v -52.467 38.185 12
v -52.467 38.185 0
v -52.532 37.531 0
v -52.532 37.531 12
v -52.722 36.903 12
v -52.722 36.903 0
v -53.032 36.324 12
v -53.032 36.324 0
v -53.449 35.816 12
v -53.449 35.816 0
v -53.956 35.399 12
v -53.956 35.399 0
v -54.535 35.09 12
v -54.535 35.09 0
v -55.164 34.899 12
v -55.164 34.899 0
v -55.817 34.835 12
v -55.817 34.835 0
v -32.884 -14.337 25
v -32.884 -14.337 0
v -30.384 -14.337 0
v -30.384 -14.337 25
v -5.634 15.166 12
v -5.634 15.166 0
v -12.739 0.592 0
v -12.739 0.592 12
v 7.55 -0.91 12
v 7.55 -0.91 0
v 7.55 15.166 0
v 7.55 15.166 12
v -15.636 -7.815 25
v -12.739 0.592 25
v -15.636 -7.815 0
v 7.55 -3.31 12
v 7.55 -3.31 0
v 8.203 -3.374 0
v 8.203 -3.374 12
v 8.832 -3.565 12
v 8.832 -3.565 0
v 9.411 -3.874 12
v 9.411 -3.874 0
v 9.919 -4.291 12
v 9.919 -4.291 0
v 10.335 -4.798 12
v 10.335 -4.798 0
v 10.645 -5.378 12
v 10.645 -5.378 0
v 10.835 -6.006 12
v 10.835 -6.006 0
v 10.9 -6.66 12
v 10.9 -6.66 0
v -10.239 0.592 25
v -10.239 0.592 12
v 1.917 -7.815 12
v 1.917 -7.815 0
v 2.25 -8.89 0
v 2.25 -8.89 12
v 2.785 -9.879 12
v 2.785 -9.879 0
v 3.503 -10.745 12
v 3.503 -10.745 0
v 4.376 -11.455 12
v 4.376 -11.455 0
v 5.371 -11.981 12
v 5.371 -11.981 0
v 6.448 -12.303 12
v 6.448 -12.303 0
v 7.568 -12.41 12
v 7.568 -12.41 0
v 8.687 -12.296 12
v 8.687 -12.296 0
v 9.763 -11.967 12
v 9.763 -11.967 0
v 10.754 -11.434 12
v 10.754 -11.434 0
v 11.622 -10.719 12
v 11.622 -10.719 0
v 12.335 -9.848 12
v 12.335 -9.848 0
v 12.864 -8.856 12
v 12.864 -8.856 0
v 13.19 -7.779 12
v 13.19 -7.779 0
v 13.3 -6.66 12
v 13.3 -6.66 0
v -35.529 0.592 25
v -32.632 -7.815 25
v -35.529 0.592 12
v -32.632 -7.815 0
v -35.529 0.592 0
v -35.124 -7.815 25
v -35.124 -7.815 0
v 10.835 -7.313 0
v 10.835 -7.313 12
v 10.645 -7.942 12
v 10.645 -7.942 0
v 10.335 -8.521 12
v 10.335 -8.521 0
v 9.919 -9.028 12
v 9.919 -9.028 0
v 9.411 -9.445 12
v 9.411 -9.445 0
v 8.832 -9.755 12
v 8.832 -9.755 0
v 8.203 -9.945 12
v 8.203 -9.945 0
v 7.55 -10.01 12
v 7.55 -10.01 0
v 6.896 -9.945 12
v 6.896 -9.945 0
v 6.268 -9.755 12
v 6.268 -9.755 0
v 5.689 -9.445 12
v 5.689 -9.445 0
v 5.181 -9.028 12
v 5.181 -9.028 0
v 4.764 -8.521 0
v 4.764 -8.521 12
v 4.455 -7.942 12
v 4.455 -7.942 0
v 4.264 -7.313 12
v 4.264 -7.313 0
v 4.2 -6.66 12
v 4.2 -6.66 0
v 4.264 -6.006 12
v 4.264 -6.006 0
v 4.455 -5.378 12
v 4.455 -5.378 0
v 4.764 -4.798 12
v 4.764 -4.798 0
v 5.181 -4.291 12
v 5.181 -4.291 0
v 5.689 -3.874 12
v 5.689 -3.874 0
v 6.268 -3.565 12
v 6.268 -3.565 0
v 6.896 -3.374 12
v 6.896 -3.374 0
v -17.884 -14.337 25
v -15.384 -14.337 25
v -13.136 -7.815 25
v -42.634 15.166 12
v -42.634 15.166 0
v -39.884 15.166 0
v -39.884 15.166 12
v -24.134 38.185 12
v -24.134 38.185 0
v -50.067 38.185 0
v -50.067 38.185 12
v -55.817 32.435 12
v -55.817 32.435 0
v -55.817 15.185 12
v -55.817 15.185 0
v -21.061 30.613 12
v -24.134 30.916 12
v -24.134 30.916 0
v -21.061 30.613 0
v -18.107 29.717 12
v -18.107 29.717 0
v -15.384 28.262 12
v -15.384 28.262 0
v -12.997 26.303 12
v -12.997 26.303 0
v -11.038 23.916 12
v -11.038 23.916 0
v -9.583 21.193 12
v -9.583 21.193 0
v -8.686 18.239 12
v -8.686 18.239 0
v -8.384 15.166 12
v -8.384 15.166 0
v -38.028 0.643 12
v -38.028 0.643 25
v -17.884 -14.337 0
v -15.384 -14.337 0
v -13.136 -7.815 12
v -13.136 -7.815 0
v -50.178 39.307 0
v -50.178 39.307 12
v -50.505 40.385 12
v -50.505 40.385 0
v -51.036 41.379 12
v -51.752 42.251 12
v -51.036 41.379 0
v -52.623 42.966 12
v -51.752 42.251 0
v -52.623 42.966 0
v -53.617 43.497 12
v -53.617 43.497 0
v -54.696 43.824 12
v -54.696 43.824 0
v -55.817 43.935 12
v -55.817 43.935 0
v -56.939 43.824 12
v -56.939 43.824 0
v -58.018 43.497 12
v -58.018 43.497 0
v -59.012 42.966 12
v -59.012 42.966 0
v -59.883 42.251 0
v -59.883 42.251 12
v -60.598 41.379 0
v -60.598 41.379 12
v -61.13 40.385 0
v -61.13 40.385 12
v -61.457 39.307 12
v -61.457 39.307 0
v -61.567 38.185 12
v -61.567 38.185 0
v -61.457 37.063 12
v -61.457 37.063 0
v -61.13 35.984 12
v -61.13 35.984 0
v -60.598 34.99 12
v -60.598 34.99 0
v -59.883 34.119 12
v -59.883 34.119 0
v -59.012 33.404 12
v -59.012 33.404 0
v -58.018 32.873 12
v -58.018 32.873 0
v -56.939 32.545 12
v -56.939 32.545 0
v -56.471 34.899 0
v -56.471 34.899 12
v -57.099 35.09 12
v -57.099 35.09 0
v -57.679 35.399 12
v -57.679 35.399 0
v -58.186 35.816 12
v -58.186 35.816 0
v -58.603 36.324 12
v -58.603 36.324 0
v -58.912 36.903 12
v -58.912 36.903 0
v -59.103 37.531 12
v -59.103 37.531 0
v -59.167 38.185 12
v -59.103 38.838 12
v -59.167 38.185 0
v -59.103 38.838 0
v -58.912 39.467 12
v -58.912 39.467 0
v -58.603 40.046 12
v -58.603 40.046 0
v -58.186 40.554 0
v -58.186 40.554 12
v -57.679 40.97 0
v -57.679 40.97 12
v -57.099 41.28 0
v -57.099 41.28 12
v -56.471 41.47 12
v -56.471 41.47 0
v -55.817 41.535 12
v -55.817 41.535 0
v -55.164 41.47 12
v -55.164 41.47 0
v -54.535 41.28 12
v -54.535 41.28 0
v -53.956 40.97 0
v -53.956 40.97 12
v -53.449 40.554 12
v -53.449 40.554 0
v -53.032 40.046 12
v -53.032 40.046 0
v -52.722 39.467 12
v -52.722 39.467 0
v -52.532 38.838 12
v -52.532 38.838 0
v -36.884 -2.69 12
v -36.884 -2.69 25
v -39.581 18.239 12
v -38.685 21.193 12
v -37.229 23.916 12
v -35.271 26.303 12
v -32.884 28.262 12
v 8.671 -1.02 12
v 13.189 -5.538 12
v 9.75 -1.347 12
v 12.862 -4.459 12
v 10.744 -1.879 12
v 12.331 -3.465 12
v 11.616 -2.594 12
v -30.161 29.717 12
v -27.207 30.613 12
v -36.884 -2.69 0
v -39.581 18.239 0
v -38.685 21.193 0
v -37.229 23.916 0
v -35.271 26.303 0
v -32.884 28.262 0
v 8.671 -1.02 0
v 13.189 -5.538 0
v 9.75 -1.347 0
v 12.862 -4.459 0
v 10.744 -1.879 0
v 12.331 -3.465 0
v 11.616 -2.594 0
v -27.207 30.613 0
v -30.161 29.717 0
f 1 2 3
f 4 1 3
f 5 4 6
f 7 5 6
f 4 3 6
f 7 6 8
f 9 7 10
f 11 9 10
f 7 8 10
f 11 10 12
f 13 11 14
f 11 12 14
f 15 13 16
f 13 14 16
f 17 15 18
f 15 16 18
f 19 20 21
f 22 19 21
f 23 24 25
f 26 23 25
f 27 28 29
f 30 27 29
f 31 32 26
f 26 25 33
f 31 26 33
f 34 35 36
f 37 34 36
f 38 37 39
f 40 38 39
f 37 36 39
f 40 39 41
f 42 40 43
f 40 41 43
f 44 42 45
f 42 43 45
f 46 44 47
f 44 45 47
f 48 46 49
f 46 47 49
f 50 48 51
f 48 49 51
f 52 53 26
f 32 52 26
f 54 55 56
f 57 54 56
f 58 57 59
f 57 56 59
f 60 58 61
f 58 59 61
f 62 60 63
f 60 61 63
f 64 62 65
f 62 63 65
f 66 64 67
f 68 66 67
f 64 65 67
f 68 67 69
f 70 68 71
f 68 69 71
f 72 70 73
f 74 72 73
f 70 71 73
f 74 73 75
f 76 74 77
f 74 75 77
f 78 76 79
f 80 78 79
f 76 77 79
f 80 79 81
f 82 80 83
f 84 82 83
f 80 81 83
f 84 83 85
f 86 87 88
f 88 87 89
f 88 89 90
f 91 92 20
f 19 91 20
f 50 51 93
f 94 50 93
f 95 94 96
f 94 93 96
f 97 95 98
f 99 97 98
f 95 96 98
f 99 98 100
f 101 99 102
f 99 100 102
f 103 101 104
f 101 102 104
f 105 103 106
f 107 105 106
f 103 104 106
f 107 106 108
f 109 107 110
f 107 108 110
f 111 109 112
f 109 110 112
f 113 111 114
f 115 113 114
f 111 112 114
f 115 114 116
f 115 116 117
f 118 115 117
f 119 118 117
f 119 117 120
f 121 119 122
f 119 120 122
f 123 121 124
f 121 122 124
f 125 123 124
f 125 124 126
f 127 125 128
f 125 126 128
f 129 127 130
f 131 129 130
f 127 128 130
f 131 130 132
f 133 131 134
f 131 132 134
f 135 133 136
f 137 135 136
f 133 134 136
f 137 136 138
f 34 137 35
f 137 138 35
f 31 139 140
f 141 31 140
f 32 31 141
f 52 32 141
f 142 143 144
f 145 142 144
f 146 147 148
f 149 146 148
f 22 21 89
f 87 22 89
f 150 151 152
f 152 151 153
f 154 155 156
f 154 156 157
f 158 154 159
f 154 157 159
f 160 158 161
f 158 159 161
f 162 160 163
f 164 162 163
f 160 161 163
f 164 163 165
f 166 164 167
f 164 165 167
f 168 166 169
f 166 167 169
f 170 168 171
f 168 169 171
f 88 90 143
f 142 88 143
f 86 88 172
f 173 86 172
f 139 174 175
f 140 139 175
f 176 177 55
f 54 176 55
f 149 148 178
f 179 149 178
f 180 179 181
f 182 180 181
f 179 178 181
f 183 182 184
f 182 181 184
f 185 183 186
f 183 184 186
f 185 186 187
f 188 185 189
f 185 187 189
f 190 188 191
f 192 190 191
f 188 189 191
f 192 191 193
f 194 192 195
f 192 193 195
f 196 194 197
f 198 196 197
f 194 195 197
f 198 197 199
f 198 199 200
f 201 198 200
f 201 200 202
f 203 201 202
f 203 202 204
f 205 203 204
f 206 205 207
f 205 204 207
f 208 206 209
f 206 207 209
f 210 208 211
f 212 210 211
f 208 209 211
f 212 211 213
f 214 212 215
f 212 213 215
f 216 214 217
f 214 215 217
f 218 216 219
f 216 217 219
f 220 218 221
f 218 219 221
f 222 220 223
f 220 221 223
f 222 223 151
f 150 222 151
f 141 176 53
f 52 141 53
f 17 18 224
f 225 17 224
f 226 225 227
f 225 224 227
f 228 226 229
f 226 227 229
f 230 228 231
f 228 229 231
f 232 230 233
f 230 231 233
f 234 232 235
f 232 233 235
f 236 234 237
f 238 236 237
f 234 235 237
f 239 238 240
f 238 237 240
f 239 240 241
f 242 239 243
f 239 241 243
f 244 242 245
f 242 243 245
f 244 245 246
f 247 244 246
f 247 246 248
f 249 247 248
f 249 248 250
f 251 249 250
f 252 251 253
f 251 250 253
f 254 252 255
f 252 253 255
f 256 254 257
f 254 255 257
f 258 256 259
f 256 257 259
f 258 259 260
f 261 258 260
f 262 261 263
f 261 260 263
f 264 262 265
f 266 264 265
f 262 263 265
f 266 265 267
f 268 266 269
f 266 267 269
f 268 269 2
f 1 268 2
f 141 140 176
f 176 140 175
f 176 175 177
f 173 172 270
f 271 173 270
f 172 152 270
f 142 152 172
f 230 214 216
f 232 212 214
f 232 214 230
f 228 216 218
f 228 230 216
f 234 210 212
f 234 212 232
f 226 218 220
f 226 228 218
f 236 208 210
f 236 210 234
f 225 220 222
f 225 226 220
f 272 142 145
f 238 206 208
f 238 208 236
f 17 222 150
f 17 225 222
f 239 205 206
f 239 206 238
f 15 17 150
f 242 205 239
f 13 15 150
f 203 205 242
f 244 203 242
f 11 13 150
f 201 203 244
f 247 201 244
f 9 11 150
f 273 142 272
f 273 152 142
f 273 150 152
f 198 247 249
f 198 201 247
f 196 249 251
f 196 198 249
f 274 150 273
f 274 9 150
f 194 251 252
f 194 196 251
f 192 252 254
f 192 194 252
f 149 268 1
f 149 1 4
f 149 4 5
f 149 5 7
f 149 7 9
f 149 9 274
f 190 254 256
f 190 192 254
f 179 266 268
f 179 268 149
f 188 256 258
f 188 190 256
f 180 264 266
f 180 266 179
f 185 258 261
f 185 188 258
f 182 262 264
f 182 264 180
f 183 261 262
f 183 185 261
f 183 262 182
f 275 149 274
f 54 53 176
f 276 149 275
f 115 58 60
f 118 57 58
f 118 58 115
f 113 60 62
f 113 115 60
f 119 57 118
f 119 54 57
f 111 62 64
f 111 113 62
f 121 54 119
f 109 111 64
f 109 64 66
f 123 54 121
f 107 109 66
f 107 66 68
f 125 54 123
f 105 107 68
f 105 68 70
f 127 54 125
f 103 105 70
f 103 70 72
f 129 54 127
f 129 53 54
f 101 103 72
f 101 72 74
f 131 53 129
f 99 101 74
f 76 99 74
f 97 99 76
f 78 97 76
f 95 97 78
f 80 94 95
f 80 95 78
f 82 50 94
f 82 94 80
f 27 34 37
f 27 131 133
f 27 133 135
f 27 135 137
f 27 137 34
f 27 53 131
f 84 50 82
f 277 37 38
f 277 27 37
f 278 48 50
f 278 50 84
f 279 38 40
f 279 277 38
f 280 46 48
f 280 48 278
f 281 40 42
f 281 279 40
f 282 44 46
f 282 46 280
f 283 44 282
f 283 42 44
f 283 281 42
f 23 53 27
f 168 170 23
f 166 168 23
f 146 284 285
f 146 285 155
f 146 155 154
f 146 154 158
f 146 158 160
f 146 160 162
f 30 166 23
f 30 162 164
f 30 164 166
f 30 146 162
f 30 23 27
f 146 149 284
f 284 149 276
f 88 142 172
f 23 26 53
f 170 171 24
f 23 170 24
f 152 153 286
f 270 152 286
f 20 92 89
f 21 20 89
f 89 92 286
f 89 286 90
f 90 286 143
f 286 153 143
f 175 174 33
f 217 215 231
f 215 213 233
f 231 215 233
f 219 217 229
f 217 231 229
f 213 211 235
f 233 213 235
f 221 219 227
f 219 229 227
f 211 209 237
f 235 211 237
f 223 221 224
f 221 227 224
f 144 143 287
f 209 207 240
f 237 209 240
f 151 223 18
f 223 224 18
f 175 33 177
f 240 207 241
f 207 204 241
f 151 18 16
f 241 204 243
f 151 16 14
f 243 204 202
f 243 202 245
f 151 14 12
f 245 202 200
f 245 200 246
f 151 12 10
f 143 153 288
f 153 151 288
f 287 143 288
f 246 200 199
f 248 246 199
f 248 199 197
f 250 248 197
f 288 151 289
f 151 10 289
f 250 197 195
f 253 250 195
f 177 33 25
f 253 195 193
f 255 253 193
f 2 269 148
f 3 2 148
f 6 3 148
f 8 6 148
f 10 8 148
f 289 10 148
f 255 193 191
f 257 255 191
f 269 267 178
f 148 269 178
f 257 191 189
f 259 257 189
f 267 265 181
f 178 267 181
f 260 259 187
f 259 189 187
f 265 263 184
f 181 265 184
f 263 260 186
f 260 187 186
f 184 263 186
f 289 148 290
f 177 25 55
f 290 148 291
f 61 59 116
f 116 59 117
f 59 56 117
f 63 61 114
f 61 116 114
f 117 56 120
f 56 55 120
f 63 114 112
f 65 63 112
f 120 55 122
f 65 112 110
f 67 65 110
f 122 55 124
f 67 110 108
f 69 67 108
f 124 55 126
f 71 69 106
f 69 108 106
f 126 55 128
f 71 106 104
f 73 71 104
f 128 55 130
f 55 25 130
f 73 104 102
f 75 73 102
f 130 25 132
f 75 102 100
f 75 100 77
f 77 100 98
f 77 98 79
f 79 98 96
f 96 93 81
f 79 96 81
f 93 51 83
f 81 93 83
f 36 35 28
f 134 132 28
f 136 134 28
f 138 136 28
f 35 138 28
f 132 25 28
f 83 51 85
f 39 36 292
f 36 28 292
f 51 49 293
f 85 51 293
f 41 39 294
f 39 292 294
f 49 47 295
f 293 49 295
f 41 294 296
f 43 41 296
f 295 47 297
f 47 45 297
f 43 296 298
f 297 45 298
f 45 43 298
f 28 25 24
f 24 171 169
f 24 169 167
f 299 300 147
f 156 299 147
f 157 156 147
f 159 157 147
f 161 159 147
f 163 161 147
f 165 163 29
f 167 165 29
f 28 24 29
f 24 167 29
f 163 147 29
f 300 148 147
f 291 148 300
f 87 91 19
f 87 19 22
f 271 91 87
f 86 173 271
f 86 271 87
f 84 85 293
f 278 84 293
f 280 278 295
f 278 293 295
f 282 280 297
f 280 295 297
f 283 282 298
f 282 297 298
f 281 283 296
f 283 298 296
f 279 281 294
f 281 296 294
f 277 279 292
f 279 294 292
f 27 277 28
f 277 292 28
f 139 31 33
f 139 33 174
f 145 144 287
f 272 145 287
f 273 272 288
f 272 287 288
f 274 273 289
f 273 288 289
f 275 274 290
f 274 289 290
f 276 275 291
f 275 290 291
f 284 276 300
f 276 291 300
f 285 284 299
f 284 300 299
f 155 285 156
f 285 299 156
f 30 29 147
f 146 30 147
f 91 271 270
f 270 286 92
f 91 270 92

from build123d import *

# Parameters (mm, degrees)
F1_DEPTH = 12
F2_DEPTH = 25


# Not quite as in the source:
# - ends of sketch curves that miss each other by under 0.0002 mm in the source are joined


with BuildPart() as f1:
    # F0 (on Top) → F1 (new body)
    with BuildSketch(Plane.XY):
        with BuildLine():
            ThreePointArc((-55.8174114415, 34.8348648238), (-58.1862191586, 40.5536725408), (-52.4674114416, 38.1848648238))
            Line((-52.4674114416, 38.1848648238), (-50.0674114416, 38.1848649627))
            ThreePointArc((-50.0674114416, 38.1848649627), (-59.8832754334, 42.2507288156), (-55.8174114415, 32.4348648238))
            Line((-55.8174114415, 32.4348648238), (-55.8174114415, 34.8348648238))
        make_face()
        with BuildLine():
            Line((-50.0674114416, 38.1848649627), (-52.4674114416, 38.1848649047))
            ThreePointArc((-52.4674114416, 38.1848649047), (-53.4486037246, 35.8160571069), (-55.8174114415, 34.8348648238))
            Line((-55.8174114415, 34.8348648238), (-55.8174114415, 32.4348648238))
            ThreePointArc((-55.8174114415, 32.4348648238), (-51.7515474497, 34.119000832), (-50.0674114416, 38.1848649627))
        make_face()
        with BuildLine():
            Line((-24.1338443596, 38.184865589), (-50.0674114416, 38.1848649627))
            ThreePointArc((-50.0674114416, 38.1848649627), (-51.7515474497, 34.119000832), (-55.8174114415, 32.4348648238))
            Line((-55.8174114415, 32.4348648238), (-55.8174114412, 15.1848640586))
            Line((-55.8174114412, 15.1848640586), (-42.6338443592, 15.1659585535))
            ThreePointArc((-42.6338443592, 15.1659585535), (-37.2153198113, 28.2474340054), (-24.1338443595, 33.6659585535))
            Line((-24.1338443595, 33.6659585535), (-24.1338443596, 38.184865589))
        make_face()
        with BuildLine():
            Line((-24.1338443595, 30.9159585535), (-24.1338443595, 33.6659585535))
            ThreePointArc((-24.1338443595, 33.6659585535), (-37.2153198113, 28.2474340054), (-42.6338443592, 15.1659585535))
            Line((-42.6338443592, 15.1659585535), (-39.8838443592, 15.1659585535))
            ThreePointArc((-39.8838443592, 15.1659585535), (-35.270776163, 26.3028903571), (-24.1338443595, 30.9159585535))
        make_face()
        with BuildLine():
            Line((7.5497227227, 15.1659585535), (-24.1338443596, 38.184865589))
            Line((-24.1338443596, 38.184865589), (-24.1338443595, 33.6659585535))
            ThreePointArc((-24.1338443595, 33.6659585535), (-11.0523689074, 28.2474340056), (-5.6338443592, 15.1659585535))
            Line((-5.6338443592, 15.1659585535), (7.5497227227, 15.1659585535))
        make_face()
        with BuildLine():
            ThreePointArc((-5.6338443592, 15.1659585535), (-11.0523689074, 28.2474340056), (-24.1338443595, 33.6659585535))
            Line((-24.1338443595, 33.6659585535), (-24.1338443595, 30.9159585535))
            ThreePointArc((-24.1338443595, 30.9159585535), (-12.9969125556, 26.3028903573), (-8.3838443592, 15.1659585535))
            Line((-8.3838443592, 15.1659585535), (-5.6338443592, 15.1659585535))
        make_face()
        with BuildLine():
            Line((7.549722723, -0.909568585), (7.5497227227, 15.1659585535))
            Line((7.5497227227, 15.1659585535), (-5.6338443592, 15.1659585535))
            Line((-5.6338443592, 15.1659585535), (-12.7387191109, 0.5919707473))
            Line((-12.7387191109, 0.5919707473), (-10.2387191109, 0.5919707473))
            Line((-10.2387191109, 0.5919707473), (-13.136122196, -7.8151351762))
            Line((-13.136122196, -7.8151351762), (1.9170354556, -7.8151351762))
            ThreePointArc((1.9170354556, -7.8151351762), (3.0939956275, -3.0251503303), (7.549722723, -0.909568585))
        make_face()
        Polygon((-42.6338443592, 15.1659585535), (-55.8174114412, 15.1848640586), (-36.8837256357, -2.690086035), (-38.0284454354, 0.643162408), (-35.5289696075, 0.5919707473), align=None)
        with BuildLine():
            ThreePointArc((13.2997227231, -6.659568585), (11.6155867149, -2.5937045931), (7.549722723, -0.909568585))
            ThreePointArc((7.549722723, -0.909568585), (3.0939956275, -3.0251503303), (1.9170354556, -7.8151351762))
            ThreePointArc((1.9170354556, -7.8151351762), (8.1304757738, -12.3801652229), (13.2997227231, -6.659568585))
        make_face()
        with BuildLine():
            ThreePointArc((10.8997227231, -6.659568585), (5.1809150061, -9.028376302), (7.549722723, -3.309568585))
            ThreePointArc((7.549722723, -3.309568585), (9.91853044, -4.290760868), (10.8997227231, -6.659568585))
        make_face(mode=Mode.SUBTRACT)
        Polygon((-38.0284454354, 0.643162408), (-36.8837256357, -2.690086035), (-35.1236572441, -7.8151351762), (-32.6315665225, -7.8151351762), (-35.5289696075, 0.5919707473), align=None)
        Polygon((-32.6315665225, -7.8151351762), (-35.1236572441, -7.8151351762), (-32.8838443592, -14.3371266833), (-30.3838443592, -14.3371266833), align=None)
        Polygon((-13.136122196, -7.8151351762), (-15.636122196, -7.8151351762), (-17.8838443592, -14.3371266833), (-15.3838443592, -14.3371266833), align=None)
        Polygon((-10.2387191109, 0.5919707473), (-12.7387191109, 0.5919707473), (-15.636122196, -7.8151351762), (-13.136122196, -7.8151351762), align=None)
    extrude(amount=F1_DEPTH)

    # F0 (on Top) → F2 (join)
    with BuildSketch(Plane.XY):
        Polygon((-38.0284454354, 0.643162408), (-36.8837256357, -2.690086035), (-35.1236572441, -7.8151351762), (-32.6315665225, -7.8151351762), (-35.5289696075, 0.5919707473), align=None)
        Polygon((-32.6315665225, -7.8151351762), (-35.1236572441, -7.8151351762), (-32.8838443592, -14.3371266833), (-30.3838443592, -14.3371266833), align=None)
        Polygon((-10.2387191109, 0.5919707473), (-12.7387191109, 0.5919707473), (-15.636122196, -7.8151351762), (-13.136122196, -7.8151351762), align=None)
        Polygon((-13.136122196, -7.8151351762), (-15.636122196, -7.8151351762), (-17.8838443592, -14.3371266833), (-15.3838443592, -14.3371266833), align=None)
    extrude(amount=F2_DEPTH)


solid = f1.part
